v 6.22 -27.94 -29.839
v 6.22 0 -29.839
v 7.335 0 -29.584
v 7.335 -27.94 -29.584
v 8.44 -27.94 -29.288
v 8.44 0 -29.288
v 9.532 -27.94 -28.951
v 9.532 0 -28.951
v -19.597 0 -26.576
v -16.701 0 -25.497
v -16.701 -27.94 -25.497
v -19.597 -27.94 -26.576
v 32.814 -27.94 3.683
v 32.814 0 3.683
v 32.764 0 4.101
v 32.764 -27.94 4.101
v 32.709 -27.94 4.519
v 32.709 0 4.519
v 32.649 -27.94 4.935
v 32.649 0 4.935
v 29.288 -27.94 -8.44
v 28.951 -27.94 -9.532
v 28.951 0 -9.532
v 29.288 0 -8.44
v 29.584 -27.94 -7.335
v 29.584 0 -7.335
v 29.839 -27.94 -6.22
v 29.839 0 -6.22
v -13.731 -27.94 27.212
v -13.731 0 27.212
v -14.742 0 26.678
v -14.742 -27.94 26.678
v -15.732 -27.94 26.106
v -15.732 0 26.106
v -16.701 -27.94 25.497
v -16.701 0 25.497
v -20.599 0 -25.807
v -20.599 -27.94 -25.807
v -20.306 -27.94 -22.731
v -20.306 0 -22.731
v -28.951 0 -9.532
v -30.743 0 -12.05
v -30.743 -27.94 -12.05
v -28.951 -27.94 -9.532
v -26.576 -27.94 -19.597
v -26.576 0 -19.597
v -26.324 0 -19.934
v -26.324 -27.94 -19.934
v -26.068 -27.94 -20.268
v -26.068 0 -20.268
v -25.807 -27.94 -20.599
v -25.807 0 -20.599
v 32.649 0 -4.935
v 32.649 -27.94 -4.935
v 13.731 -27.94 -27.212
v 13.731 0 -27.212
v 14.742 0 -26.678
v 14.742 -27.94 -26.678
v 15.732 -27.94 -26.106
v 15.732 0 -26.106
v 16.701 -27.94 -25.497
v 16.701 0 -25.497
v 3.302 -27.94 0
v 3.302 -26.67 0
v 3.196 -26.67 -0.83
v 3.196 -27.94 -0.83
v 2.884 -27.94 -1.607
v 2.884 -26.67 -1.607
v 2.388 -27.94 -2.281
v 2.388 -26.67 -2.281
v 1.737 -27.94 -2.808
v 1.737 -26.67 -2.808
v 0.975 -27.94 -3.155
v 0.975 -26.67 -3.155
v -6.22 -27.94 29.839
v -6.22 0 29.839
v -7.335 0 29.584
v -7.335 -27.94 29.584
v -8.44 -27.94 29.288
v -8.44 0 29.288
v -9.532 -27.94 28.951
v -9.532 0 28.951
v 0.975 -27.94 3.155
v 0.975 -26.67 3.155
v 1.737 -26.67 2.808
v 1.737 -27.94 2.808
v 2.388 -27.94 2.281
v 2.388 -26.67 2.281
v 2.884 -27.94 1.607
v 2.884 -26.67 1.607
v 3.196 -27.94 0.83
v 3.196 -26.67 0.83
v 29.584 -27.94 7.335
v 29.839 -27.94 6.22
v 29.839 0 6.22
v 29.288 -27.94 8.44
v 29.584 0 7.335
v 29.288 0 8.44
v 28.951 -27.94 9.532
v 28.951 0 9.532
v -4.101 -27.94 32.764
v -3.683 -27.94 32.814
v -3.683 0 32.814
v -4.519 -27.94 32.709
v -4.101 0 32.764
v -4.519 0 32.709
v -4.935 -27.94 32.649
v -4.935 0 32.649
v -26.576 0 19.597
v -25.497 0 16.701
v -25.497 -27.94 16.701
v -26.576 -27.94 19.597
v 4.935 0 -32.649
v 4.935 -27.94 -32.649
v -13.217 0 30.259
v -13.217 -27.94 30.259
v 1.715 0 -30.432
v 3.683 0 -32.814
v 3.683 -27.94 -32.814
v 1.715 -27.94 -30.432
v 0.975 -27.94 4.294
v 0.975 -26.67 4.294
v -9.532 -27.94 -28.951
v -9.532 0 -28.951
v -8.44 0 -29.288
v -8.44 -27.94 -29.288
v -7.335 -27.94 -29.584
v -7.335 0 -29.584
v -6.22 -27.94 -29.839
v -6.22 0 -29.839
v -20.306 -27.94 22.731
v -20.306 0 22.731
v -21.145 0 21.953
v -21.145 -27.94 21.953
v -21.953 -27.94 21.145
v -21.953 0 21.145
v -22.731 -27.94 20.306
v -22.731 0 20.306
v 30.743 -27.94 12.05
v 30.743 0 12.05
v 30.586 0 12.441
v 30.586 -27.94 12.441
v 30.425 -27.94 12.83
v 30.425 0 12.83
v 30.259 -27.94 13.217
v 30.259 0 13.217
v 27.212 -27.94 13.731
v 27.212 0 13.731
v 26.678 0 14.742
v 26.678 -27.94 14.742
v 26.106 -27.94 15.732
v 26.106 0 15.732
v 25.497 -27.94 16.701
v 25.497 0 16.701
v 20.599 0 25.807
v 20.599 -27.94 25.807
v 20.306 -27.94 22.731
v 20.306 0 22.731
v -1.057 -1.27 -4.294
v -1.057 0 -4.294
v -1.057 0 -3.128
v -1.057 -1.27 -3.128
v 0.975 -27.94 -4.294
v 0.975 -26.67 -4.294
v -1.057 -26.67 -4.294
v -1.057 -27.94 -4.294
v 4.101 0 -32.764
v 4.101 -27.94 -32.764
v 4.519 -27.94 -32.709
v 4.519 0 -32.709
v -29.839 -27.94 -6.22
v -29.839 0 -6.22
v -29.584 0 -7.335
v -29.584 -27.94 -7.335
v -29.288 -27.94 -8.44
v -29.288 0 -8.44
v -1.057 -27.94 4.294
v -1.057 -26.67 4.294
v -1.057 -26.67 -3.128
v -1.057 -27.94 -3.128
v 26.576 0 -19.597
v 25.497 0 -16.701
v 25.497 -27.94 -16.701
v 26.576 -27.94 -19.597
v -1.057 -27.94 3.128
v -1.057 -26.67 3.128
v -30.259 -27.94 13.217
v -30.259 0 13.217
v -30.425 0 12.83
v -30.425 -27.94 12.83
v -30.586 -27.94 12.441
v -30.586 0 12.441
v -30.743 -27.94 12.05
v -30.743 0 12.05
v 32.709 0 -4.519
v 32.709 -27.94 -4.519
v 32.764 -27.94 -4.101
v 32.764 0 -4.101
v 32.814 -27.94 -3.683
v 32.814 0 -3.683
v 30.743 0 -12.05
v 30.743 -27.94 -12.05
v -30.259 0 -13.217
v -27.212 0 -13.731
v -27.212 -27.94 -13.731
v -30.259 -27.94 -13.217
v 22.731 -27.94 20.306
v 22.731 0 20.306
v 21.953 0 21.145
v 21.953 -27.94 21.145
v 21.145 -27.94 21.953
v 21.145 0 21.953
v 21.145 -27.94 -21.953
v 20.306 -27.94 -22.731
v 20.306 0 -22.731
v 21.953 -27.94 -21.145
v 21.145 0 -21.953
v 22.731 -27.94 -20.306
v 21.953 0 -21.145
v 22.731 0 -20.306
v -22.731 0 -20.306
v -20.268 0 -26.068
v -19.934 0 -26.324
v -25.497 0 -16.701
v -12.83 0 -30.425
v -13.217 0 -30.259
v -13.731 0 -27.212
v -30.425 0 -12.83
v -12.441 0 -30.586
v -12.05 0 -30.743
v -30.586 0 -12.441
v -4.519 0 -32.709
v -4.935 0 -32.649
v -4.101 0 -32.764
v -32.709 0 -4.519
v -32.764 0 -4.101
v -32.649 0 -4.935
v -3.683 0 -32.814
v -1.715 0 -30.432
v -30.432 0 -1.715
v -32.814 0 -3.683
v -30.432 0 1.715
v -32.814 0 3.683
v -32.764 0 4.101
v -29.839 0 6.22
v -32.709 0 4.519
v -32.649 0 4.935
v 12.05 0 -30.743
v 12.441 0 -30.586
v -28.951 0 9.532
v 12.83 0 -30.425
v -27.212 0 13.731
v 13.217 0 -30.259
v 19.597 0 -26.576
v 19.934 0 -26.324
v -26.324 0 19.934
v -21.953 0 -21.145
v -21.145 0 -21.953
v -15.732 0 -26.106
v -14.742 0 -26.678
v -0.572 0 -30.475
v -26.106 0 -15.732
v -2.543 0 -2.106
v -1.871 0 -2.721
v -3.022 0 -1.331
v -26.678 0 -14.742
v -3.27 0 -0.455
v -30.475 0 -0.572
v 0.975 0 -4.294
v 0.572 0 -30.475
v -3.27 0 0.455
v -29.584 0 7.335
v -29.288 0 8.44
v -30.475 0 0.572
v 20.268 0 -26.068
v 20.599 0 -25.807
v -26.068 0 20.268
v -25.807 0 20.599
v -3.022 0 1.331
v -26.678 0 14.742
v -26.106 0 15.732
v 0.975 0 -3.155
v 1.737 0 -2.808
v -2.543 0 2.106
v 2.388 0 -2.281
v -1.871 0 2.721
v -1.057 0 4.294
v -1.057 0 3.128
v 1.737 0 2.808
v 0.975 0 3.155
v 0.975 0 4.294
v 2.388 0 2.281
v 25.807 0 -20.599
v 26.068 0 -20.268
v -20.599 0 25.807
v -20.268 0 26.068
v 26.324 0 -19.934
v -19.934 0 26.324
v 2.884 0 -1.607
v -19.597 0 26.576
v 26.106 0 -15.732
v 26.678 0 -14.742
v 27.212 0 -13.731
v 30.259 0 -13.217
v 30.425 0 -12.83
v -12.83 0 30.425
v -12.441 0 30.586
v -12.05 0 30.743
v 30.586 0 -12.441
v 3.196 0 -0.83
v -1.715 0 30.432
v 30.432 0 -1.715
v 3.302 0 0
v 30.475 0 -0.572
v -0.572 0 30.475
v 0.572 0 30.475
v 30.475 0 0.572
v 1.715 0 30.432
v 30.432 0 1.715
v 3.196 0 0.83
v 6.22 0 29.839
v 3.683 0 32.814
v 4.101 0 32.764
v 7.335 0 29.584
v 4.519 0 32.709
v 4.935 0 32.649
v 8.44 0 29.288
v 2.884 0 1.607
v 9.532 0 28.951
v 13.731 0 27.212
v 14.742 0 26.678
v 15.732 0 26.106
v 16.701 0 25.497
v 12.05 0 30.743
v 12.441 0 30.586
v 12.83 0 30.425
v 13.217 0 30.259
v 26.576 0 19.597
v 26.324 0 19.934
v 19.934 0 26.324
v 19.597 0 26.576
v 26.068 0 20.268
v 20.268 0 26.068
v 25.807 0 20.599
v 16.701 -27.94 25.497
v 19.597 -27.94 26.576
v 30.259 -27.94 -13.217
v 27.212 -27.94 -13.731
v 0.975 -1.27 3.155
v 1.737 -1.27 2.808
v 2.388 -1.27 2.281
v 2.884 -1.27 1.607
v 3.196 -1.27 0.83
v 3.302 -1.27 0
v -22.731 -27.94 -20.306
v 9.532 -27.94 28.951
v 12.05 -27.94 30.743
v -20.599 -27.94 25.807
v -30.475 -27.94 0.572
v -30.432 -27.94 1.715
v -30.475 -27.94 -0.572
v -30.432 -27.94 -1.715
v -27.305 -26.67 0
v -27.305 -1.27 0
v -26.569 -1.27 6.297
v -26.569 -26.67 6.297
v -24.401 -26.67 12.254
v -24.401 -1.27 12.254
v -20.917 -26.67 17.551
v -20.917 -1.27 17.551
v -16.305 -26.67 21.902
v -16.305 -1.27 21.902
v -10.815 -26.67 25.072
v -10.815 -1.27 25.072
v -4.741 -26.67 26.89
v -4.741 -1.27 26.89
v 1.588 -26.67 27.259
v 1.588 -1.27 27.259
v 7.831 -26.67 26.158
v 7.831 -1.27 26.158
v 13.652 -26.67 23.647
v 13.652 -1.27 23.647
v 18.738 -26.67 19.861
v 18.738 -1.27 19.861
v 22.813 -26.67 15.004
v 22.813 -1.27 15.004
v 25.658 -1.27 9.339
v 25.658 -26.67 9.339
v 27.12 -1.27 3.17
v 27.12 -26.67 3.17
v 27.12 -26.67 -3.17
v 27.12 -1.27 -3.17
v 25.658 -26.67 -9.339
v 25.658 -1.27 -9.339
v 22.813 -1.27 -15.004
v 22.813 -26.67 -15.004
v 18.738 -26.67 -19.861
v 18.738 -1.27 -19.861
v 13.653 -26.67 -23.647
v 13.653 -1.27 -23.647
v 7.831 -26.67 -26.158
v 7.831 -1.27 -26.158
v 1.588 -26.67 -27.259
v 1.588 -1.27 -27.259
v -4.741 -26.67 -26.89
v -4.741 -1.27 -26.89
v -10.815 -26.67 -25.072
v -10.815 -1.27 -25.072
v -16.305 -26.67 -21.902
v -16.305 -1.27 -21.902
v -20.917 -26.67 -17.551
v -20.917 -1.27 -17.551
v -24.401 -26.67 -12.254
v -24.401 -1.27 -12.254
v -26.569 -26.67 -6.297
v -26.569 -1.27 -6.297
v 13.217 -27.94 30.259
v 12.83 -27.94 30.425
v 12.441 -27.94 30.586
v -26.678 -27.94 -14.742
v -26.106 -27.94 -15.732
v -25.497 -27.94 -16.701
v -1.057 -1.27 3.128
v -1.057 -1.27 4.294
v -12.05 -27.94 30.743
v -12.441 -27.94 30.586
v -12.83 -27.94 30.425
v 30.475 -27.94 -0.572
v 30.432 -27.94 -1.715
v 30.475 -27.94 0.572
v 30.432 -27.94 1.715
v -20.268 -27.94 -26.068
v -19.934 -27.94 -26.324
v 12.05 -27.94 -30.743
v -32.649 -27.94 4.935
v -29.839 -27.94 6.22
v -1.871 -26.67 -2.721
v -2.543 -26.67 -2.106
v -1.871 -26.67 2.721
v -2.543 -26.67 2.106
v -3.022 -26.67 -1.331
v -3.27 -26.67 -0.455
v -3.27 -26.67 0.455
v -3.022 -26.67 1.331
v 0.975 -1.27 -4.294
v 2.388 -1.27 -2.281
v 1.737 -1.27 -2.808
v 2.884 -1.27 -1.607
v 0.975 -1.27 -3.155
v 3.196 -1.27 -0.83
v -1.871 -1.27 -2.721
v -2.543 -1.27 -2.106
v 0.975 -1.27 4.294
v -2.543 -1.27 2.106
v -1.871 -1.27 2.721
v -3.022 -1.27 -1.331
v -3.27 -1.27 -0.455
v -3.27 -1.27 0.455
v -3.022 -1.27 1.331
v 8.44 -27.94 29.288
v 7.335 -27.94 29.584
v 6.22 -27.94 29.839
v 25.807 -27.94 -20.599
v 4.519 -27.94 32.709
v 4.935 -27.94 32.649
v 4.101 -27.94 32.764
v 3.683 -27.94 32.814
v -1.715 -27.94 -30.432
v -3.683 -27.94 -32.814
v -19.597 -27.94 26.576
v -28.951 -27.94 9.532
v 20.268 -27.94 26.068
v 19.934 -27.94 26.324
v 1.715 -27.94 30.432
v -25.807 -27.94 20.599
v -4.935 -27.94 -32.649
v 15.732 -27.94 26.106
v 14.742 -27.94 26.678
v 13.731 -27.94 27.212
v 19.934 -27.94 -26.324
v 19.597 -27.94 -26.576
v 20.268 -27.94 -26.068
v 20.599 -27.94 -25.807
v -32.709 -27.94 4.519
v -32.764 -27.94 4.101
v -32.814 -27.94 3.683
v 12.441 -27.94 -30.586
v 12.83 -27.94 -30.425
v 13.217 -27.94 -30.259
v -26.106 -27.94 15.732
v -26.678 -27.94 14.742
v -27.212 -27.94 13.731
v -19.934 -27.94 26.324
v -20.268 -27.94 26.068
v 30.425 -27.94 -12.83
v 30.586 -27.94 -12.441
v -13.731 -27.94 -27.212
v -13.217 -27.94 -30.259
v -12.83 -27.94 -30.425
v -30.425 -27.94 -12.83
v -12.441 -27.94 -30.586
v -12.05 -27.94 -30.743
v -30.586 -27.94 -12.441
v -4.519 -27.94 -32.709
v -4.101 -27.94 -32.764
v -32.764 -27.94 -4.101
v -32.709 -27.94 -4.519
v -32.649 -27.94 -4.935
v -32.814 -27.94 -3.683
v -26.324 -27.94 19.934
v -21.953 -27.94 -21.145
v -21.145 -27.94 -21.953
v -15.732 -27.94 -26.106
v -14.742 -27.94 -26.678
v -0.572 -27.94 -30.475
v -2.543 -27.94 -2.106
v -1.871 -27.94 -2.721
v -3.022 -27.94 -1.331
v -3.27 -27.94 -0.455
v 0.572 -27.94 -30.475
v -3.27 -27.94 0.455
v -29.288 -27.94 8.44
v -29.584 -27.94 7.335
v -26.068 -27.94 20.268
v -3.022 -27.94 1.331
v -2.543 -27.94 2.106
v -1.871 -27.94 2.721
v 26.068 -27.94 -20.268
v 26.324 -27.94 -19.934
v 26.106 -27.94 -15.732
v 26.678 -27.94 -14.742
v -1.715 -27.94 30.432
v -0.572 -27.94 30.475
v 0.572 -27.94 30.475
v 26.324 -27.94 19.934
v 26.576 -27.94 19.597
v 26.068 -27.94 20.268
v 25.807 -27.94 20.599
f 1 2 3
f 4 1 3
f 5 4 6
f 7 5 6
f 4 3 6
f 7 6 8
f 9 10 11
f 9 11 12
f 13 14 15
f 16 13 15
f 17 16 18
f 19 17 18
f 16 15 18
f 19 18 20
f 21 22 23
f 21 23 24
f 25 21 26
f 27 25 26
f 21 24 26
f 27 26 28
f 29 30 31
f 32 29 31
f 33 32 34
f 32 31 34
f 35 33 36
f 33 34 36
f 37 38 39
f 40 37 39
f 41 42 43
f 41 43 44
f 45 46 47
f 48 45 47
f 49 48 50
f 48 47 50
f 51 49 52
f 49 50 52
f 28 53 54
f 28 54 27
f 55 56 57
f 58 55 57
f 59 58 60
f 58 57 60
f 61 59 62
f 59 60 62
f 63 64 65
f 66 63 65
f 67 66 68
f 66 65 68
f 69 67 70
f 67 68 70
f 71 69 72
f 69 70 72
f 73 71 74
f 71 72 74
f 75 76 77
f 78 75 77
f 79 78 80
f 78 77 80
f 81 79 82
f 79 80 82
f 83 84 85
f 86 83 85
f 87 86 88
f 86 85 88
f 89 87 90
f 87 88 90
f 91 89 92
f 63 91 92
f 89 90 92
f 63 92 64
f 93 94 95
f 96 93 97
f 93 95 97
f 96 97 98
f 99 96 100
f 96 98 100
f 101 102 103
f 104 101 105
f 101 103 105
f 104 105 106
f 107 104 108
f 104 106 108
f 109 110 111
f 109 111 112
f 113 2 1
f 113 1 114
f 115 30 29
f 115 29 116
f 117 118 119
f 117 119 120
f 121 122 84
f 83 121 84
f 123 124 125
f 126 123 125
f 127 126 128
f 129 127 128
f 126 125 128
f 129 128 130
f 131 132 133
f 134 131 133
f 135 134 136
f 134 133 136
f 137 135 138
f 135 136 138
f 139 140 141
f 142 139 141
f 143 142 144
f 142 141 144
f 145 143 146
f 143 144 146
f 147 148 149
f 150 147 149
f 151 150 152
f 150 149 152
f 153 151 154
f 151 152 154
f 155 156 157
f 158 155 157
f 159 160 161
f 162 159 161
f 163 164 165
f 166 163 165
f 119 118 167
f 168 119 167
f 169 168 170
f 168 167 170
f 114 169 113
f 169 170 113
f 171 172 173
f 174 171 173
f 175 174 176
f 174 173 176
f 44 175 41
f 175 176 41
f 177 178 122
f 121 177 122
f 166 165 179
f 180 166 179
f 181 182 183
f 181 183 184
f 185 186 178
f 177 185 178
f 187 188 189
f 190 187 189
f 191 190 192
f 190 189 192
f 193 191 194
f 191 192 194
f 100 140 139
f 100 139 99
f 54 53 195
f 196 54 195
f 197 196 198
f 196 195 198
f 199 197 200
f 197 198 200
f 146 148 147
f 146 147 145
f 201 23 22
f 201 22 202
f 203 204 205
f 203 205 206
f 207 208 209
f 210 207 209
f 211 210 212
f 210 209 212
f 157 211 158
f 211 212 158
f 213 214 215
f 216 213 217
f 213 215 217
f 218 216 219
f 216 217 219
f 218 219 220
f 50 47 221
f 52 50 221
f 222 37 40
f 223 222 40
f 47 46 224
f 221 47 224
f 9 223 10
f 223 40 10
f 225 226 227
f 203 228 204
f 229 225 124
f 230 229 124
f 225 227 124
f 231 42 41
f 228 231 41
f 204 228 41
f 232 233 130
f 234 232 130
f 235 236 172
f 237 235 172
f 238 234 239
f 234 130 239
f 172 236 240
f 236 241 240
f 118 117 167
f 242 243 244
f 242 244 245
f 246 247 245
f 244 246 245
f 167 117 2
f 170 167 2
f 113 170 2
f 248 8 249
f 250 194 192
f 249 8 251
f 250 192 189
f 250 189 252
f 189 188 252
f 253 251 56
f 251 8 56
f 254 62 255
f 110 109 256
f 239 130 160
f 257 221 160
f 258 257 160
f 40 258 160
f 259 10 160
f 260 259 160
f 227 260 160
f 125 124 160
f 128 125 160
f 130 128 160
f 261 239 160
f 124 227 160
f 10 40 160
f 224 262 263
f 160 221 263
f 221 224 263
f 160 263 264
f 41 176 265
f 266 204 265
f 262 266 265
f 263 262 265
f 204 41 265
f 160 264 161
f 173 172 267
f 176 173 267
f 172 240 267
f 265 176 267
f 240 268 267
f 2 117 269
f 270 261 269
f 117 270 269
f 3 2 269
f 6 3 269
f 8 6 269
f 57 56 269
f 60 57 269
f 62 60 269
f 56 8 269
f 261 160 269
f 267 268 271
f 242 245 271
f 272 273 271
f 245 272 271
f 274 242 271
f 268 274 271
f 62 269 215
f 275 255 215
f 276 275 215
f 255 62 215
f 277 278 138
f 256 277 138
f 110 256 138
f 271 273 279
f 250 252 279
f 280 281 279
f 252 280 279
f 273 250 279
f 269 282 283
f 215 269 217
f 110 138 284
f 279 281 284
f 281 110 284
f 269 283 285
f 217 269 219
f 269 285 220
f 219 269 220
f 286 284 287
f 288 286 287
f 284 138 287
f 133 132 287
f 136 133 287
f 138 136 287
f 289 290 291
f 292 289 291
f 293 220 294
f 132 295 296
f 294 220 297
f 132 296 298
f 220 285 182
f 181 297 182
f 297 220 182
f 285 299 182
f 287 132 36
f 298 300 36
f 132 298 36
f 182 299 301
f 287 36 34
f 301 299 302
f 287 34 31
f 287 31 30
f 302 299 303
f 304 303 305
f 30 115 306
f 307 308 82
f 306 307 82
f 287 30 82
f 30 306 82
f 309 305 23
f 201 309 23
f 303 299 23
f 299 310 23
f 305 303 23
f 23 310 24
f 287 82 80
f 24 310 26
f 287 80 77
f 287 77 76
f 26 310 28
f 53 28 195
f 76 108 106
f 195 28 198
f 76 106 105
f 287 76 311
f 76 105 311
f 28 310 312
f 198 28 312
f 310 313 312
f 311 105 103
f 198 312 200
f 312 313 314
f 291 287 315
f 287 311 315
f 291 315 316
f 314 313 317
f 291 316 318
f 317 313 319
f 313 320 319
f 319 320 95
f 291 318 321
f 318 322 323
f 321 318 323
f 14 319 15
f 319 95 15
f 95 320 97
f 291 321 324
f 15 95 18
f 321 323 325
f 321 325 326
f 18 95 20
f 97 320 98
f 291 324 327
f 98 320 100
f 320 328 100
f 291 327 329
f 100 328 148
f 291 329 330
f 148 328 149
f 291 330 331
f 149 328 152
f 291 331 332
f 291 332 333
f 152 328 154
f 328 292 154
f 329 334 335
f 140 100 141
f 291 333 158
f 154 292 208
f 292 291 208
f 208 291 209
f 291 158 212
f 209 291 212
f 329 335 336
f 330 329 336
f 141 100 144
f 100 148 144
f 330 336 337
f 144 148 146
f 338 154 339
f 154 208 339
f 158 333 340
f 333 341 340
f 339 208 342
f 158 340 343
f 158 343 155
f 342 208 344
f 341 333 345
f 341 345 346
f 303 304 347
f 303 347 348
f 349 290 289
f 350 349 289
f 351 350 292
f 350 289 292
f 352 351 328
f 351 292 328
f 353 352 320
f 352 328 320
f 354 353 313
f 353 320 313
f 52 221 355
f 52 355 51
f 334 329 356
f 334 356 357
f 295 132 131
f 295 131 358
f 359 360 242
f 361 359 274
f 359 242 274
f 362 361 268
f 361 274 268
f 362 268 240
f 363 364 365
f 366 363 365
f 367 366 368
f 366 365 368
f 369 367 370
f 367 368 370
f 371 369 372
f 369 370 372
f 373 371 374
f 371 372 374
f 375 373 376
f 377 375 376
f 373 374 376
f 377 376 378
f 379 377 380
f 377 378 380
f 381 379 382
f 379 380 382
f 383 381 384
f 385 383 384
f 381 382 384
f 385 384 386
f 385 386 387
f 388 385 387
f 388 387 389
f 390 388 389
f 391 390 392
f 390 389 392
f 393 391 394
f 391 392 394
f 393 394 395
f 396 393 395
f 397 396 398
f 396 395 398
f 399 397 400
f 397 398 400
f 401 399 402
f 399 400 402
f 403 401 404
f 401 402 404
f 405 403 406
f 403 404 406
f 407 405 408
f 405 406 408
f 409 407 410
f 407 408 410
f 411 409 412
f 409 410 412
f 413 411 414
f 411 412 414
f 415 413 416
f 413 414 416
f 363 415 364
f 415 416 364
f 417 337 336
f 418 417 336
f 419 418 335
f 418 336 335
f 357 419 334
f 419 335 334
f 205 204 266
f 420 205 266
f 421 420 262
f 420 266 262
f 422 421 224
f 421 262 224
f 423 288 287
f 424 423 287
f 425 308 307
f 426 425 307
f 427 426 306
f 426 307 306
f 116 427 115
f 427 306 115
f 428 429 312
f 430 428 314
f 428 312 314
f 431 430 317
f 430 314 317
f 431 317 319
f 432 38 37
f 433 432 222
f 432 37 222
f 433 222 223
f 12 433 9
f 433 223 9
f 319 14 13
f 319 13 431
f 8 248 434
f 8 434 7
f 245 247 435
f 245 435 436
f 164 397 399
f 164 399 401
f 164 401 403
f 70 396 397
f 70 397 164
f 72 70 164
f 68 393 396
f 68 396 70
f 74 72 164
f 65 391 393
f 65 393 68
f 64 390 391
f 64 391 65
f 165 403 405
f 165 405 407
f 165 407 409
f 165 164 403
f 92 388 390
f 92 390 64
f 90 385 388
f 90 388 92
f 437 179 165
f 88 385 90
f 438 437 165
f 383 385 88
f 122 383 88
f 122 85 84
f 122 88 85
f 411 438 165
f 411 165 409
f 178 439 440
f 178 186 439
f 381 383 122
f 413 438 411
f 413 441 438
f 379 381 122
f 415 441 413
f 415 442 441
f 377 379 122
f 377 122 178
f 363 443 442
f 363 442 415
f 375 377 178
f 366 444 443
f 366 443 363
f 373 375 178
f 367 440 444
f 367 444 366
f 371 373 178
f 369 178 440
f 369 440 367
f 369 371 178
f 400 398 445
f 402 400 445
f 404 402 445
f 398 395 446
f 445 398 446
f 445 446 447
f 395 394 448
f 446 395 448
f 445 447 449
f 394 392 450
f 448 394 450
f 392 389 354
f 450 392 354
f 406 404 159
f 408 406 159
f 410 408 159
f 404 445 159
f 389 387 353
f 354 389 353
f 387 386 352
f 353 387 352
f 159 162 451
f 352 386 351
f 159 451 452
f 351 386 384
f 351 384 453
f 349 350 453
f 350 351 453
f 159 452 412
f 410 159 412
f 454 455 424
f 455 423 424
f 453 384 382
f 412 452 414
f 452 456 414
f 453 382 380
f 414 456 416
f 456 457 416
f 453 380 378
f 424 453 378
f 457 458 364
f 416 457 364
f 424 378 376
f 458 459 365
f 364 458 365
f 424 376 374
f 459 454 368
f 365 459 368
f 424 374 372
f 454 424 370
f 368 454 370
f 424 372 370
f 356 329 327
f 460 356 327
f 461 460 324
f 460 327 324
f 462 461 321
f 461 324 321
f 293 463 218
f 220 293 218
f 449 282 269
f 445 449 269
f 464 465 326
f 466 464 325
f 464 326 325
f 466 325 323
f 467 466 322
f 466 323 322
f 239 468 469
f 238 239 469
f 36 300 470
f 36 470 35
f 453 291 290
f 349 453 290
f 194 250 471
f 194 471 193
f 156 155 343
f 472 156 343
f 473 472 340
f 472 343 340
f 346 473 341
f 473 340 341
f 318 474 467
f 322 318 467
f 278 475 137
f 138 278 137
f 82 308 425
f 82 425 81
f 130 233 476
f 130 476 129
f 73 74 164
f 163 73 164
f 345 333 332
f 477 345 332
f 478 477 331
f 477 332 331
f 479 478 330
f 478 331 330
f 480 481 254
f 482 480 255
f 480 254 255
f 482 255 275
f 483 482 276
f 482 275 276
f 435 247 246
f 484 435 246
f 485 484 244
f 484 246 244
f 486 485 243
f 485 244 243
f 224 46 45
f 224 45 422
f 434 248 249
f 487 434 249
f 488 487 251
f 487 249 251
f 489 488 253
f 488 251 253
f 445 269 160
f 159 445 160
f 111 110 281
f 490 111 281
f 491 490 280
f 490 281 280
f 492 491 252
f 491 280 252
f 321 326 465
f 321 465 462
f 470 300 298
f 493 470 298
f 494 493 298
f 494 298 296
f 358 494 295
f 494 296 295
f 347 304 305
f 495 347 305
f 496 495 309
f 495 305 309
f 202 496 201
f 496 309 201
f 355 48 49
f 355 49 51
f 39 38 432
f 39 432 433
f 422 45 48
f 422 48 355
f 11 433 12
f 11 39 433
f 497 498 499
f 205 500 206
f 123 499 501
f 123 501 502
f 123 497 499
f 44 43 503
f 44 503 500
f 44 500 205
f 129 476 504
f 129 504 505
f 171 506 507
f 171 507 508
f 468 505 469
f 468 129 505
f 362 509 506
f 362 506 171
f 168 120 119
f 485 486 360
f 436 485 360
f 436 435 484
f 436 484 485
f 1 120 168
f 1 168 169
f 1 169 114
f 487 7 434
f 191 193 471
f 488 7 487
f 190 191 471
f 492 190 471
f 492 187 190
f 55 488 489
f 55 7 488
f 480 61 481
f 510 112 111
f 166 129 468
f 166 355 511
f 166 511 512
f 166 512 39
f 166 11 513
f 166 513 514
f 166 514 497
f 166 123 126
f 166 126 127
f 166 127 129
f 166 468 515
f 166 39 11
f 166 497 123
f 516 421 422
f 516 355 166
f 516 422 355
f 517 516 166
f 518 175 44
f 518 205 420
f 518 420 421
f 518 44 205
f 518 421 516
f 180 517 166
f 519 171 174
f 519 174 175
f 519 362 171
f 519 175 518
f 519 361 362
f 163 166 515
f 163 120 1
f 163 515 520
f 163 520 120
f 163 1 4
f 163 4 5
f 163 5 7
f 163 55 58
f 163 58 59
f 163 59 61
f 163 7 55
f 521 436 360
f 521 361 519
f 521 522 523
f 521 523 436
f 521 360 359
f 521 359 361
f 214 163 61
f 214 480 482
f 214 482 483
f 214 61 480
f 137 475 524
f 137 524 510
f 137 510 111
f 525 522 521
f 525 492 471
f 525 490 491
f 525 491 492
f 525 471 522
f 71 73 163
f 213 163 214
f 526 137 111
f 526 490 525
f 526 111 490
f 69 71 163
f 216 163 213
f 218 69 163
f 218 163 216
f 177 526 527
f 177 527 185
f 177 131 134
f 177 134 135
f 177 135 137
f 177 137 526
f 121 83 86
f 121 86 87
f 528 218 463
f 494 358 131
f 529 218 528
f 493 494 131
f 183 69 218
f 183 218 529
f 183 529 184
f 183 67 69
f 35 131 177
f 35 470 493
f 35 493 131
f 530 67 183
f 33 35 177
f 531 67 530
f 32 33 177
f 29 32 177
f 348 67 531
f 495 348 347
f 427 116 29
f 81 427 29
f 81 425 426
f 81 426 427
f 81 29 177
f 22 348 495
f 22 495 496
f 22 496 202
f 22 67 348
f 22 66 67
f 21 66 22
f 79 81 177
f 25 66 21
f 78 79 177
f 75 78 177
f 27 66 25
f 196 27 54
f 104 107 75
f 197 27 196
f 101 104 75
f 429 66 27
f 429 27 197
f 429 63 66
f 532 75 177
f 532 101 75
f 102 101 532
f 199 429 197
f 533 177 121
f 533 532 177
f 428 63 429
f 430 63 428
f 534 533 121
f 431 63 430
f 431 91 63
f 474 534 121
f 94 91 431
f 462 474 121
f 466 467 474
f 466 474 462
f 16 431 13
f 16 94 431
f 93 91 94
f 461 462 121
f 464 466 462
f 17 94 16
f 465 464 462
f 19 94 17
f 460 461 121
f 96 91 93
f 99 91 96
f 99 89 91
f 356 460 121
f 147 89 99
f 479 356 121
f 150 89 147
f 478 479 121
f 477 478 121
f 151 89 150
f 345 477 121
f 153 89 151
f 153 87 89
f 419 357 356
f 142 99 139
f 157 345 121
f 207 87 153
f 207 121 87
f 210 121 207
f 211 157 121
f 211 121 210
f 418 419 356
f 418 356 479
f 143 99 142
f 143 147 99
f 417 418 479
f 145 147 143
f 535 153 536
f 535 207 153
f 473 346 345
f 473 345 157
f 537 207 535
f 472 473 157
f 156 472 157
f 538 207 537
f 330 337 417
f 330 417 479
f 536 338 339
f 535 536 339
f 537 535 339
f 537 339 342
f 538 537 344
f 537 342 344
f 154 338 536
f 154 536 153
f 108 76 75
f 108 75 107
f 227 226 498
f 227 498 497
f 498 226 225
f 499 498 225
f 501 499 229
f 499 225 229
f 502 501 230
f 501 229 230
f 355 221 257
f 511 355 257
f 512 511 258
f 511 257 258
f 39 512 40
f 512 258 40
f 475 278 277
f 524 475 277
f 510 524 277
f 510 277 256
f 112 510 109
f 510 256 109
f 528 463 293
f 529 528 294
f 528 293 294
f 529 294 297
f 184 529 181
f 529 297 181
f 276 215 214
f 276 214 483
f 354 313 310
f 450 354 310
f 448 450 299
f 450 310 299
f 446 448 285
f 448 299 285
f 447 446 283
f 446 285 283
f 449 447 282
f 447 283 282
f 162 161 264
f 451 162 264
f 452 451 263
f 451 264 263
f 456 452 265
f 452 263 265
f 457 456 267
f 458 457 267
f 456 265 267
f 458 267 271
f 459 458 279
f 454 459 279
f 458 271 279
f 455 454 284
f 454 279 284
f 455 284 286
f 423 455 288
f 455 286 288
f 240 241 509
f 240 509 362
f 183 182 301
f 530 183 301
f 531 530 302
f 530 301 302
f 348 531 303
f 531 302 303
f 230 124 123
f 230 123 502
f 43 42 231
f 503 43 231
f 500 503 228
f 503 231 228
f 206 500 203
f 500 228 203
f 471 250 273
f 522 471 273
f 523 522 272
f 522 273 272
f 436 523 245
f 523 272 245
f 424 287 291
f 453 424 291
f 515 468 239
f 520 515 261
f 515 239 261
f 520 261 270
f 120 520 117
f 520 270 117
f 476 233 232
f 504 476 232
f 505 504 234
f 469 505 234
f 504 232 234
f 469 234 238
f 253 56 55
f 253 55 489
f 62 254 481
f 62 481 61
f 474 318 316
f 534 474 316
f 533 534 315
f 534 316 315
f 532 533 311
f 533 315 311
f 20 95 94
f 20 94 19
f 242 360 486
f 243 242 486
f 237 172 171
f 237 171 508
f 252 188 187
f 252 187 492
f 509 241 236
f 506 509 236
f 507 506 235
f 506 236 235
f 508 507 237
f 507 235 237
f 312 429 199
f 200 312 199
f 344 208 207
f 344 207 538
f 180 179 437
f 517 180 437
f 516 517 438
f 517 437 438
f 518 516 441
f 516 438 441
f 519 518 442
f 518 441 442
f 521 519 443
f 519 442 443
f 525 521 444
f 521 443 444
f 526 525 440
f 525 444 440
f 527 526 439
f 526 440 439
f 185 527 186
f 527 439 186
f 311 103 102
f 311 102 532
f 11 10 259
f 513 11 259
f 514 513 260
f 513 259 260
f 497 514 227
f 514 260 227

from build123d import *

# Parameters (mm, degrees)
F0_R     = 33.02
F0_R_2   = 30.48
F1_DEPTH = 27.94
F3_DEPTH = 27.94
F4_DEPTH = 27.94
F6_R     = 27.305
F7_DEPTH = 25.4


with BuildPart() as f1:
    # F0 (on Front) → F1 (new body)
    with BuildSketch(Plane.XZ):
        Circle(F0_R)
        Circle(F0_R_2, mode=Mode.SUBTRACT)
    extrude(amount=F1_DEPTH)

    # F2 (on Front) → F3 (cut)
    with BuildSketch(Plane.XZ):
        with BuildLine():
            Line((-3.683, 32.8139590876), (-1.7145, 30.431741484))
            ThreePointArc((-1.7145, 30.431741484), (0, 30.48), (1.7145, 30.431741484))
            Line((1.7145, 30.431741484), (3.683, 32.8139590876))
            ThreePointArc((3.683, 32.8139590876), (0, 33.02), (-3.683, 32.8139590876))
        make_face()
        with BuildLine():
            ThreePointArc((-9.5323941009, 28.9510597855), (-7.8888044947, 29.4414191853), (-6.2202344425, 29.8385502912))
            Line((-6.2202344425, 29.8385502912), (-4.9353727389, 32.6490810886))
            ThreePointArc((-4.9353727389, 32.6490810886), (-8.5462048693, 31.8948707841), (-12.0503823753, 30.7426200024))
            Line((-12.0503823753, 30.7426200024), (-9.5323941009, 28.9510597855))
        make_face()
        with BuildLine():
            ThreePointArc((-16.7006712968, 25.4974112066), (-15.24, 26.3964543073), (-13.7310701872, 27.2119112066))
            Line((-13.7310701872, 27.2119112066), (-13.2174079816, 30.2592221686))
            ThreePointArc((-13.2174079816, 30.2592221686), (-16.51, 28.596158833), (-19.5965511059, 26.5762221686))
            Line((-19.5965511059, 26.5762221686), (-16.7006712968, 25.4974112066))
        make_face()
        with BuildLine():
            ThreePointArc((-22.730825343, 20.3061561903), (-21.5526146906, 21.5526146906), (-20.3061561903, 22.730825343))
            Line((-20.3061561903, 22.730825343), (-20.5986987133, 25.8072472635))
            ThreePointArc((-20.5986987133, 25.8072472635), (-23.3486659148, 23.3486659148), (-25.8072472635, 20.5986987133))
            Line((-25.8072472635, 20.5986987133), (-22.730825343, 20.3061561903))
        make_face()
        with BuildLine():
            ThreePointArc((-27.2119112066, 13.7310701872), (-26.3964543073, 15.24), (-25.4974112066, 16.7006712968))
            Line((-25.4974112066, 16.7006712968), (-26.5762221686, 19.5965511059))
            ThreePointArc((-26.5762221686, 19.5965511059), (-28.596158833, 16.51), (-30.2592221686, 13.2174079816))
            Line((-30.2592221686, 13.2174079816), (-27.2119112066, 13.7310701872))
        make_face()
        with BuildLine():
            ThreePointArc((-29.8385502912, 6.2202344425), (-29.4414191853, 7.8888044947), (-28.9510597855, 9.5323941009))
            Line((-28.9510597855, 9.5323941009), (-30.7426200024, 12.0503823753))
            ThreePointArc((-30.7426200024, 12.0503823753), (-31.8948707841, 8.5462048693), (-32.6490810886, 4.9353727389))
            Line((-32.6490810886, 4.9353727389), (-29.8385502912, 6.2202344425))
        make_face()
        with BuildLine():
            ThreePointArc((-30.431741484, -1.7145), (-30.48, 0), (-30.431741484, 1.7145))
            Line((-30.431741484, 1.7145), (-32.8139590876, 3.683))
            ThreePointArc((-32.8139590876, 3.683), (-33.02, 0), (-32.8139590876, -3.683))
            Line((-32.8139590876, -3.683), (-30.431741484, -1.7145))
        make_face()
        with BuildLine():
            ThreePointArc((-28.9510597855, -9.5323941009), (-29.4414191853, -7.8888044947), (-29.8385502912, -6.2202344425))
            Line((-29.8385502912, -6.2202344425), (-32.6490810886, -4.9353727389))
            ThreePointArc((-32.6490810886, -4.9353727389), (-31.8948707841, -8.5462048693), (-30.7426200024, -12.0503823753))
            Line((-30.7426200024, -12.0503823753), (-28.9510597855, -9.5323941009))
        make_face()
        with BuildLine():
            ThreePointArc((-25.4974112066, -16.7006712968), (-26.3964543073, -15.24), (-27.2119112066, -13.7310701872))
            Line((-27.2119112066, -13.7310701872), (-30.2592221686, -13.2174079816))
            ThreePointArc((-30.2592221686, -13.2174079816), (-28.596158833, -16.51), (-26.5762221686, -19.5965511059))
            Line((-26.5762221686, -19.5965511059), (-25.4974112066, -16.7006712968))
        make_face()
        with BuildLine():
            ThreePointArc((-20.3061561903, -22.730825343), (-21.5526146906, -21.5526146906), (-22.730825343, -20.3061561903))
            Line((-22.730825343, -20.3061561903), (-25.8072472635, -20.5986987133))
            ThreePointArc((-25.8072472635, -20.5986987133), (-23.3486659148, -23.3486659148), (-20.5986987133, -25.8072472635))
            Line((-20.5986987133, -25.8072472635), (-20.3061561903, -22.730825343))
        make_face()
        with BuildLine():
            ThreePointArc((-13.7310701872, -27.2119112066), (-15.24, -26.3964543073), (-16.7006712968, -25.4974112066))
            Line((-16.7006712968, -25.4974112066), (-19.5965511059, -26.5762221686))
            ThreePointArc((-19.5965511059, -26.5762221686), (-16.51, -28.596158833), (-13.2174079816, -30.2592221686))
            Line((-13.2174079816, -30.2592221686), (-13.7310701872, -27.2119112066))
        make_face()
        with BuildLine():
            ThreePointArc((-6.2202344425, -29.8385502912), (-7.8888044947, -29.4414191853), (-9.5323941009, -28.9510597855))
            Line((-9.5323941009, -28.9510597855), (-12.0503823753, -30.7426200024))
            ThreePointArc((-12.0503823753, -30.7426200024), (-8.5462048693, -31.8948707841), (-4.9353727389, -32.6490810886))
            Line((-4.9353727389, -32.6490810886), (-6.2202344425, -29.8385502912))
        make_face()
        with BuildLine():
            ThreePointArc((1.7145, -30.431741484), (0, -30.48), (-1.7145, -30.431741484))
            Line((-1.7145, -30.431741484), (-3.683, -32.8139590876))
            ThreePointArc((-3.683, -32.8139590876), (0, -33.02), (3.683, -32.8139590876))
            Line((3.683, -32.8139590876), (1.7145, -30.431741484))
        make_face()
        with BuildLine():
            ThreePointArc((9.5323941009, -28.9510597855), (7.8888044947, -29.4414191853), (6.2202344425, -29.8385502912))
            Line((6.2202344425, -29.8385502912), (4.9353727389, -32.6490810886))
            ThreePointArc((4.9353727389, -32.6490810886), (8.5462048693, -31.8948707841), (12.0503823753, -30.7426200024))
            Line((12.0503823753, -30.7426200024), (9.5323941009, -28.9510597855))
        make_face()
        with BuildLine():
            ThreePointArc((16.7006712968, -25.4974112066), (15.24, -26.3964543073), (13.7310701872, -27.2119112066))
            Line((13.7310701872, -27.2119112066), (13.2174079816, -30.2592221686))
            ThreePointArc((13.2174079816, -30.2592221686), (16.51, -28.596158833), (19.5965511059, -26.5762221686))
            Line((19.5965511059, -26.5762221686), (16.7006712968, -25.4974112066))
        make_face()
        with BuildLine():
            ThreePointArc((22.730825343, -20.3061561903), (21.5526146906, -21.5526146906), (20.3061561903, -22.730825343))
            Line((20.3061561903, -22.730825343), (20.5986987133, -25.8072472635))
            ThreePointArc((20.5986987133, -25.8072472635), (23.3486659148, -23.3486659148), (25.8072472635, -20.5986987133))
            Line((25.8072472635, -20.5986987133), (22.730825343, -20.3061561903))
        make_face()
        with BuildLine():
            ThreePointArc((27.2119112066, -13.7310701872), (26.3964543074, -15.24), (25.4974112066, -16.7006712968))
            Line((25.4974112066, -16.7006712968), (26.5762221686, -19.5965511059))
            ThreePointArc((26.5762221686, -19.5965511059), (28.596158833, -16.51), (30.2592221686, -13.2174079816))
            Line((30.2592221686, -13.2174079816), (27.2119112066, -13.7310701872))
        make_face()
        with BuildLine():
            ThreePointArc((29.8385502912, -6.2202344425), (29.4414191853, -7.8888044947), (28.9510597855, -9.5323941009))
            Line((28.9510597855, -9.5323941009), (30.7426200024, -12.0503823753))
            ThreePointArc((30.7426200024, -12.0503823753), (31.8948707841, -8.5462048693), (32.6490810886, -4.9353727389))
            Line((32.6490810886, -4.9353727389), (29.8385502912, -6.2202344425))
        make_face()
        with BuildLine():
            ThreePointArc((30.431741484, 1.7145), (30.48, 0), (30.431741484, -1.7145))
            Line((30.431741484, -1.7145), (32.8139590876, -3.683))
            ThreePointArc((32.8139590876, -3.683), (33.02, 0), (32.8139590876, 3.683))
            Line((32.8139590876, 3.683), (30.431741484, 1.7145))
        make_face()
        with BuildLine():
            ThreePointArc((28.9510597855, 9.5323941009), (29.4414191853, 7.8888044947), (29.8385502912, 6.2202344425))
            Line((29.8385502912, 6.2202344425), (32.6490810886, 4.9353727389))
            ThreePointArc((32.6490810886, 4.9353727389), (31.8948707841, 8.5462048693), (30.7426200024, 12.0503823753))
            Line((30.7426200024, 12.0503823753), (28.9510597855, 9.5323941009))
        make_face()
        with BuildLine():
            ThreePointArc((25.4974112066, 16.7006712968), (26.3964543073, 15.24), (27.2119112066, 13.7310701872))
            Line((27.2119112066, 13.7310701872), (30.2592221686, 13.2174079816))
            ThreePointArc((30.2592221686, 13.2174079816), (28.596158833, 16.51), (26.5762221686, 19.5965511059))
            Line((26.5762221686, 19.5965511059), (25.4974112066, 16.7006712968))
        make_face()
        with BuildLine():
            ThreePointArc((20.3061561903, 22.730825343), (21.5526146906, 21.5526146906), (22.730825343, 20.3061561903))
            Line((22.730825343, 20.3061561903), (25.8072472635, 20.5986987133))
            ThreePointArc((25.8072472635, 20.5986987133), (23.3486659148, 23.3486659148), (20.5986987133, 25.8072472635))
            Line((20.5986987133, 25.8072472635), (20.3061561903, 22.730825343))
        make_face()
        with BuildLine():
            ThreePointArc((13.7310701872, 27.2119112066), (15.24, 26.3964543073), (16.7006712968, 25.4974112066))
            Line((16.7006712968, 25.4974112066), (19.5965511059, 26.5762221686))
            ThreePointArc((19.5965511059, 26.5762221686), (16.51, 28.596158833), (13.2174079816, 30.2592221686))
            Line((13.2174079816, 30.2592221686), (13.7310701872, 27.2119112066))
        make_face()
        with BuildLine():
            ThreePointArc((6.2202344425, 29.8385502912), (7.8888044947, 29.4414191853), (9.5323941009, 28.9510597855))
            Line((9.5323941009, 28.9510597855), (12.0503823753, 30.7426200024))
            ThreePointArc((12.0503823753, 30.7426200024), (8.5462048693, 31.8948707841), (4.9353727389, 32.6490810886))
            Line((4.9353727389, 32.6490810886), (6.2202344425, 29.8385502912))
        make_face()
    extrude(amount=F3_DEPTH, mode=Mode.SUBTRACT)

    # F0 (on Front) → F4 (join)
    with BuildSketch(Plane.XZ):
        Circle(F0_R_2)
        with BuildLine():
            ThreePointArc((0.97536, 3.154659549), (2.6574275832, 1.9599190391), (3.302, 0))
            ThreePointArc((3.302, 0), (2.6574275832, -1.9599190391), (0.97536, -3.154659549))
            Line((0.97536, -3.154659549), (0.97536, -4.2937106432))
            Line((0.97536, -4.2937106432), (-1.05664, -4.2937106432))
            Line((-1.05664, -4.2937106432), (-1.05664, -3.1283727256))
            ThreePointArc((-1.05664, -3.1283727256), (-3.302, 0), (-1.05664, 3.1283727256))
            Line((-1.05664, 3.1283727256), (-1.05664, 4.2937106432))
            Line((-1.05664, 4.2937106432), (0.97536, 4.2937106432))
            Line((0.97536, 4.2937106432), (0.97536, 3.154659549))
        make_face(mode=Mode.SUBTRACT)
    extrude(amount=F4_DEPTH)

    # F6 (on offset) → F7 (cut)
    with BuildSketch(Plane(origin=(0, -1.27, 0), x_dir=(-1, 0, 0), z_dir=(0, 1, 0))):
        Circle(F6_R)
    extrude(amount=-F7_DEPTH, mode=Mode.SUBTRACT)


solid = f1.part
